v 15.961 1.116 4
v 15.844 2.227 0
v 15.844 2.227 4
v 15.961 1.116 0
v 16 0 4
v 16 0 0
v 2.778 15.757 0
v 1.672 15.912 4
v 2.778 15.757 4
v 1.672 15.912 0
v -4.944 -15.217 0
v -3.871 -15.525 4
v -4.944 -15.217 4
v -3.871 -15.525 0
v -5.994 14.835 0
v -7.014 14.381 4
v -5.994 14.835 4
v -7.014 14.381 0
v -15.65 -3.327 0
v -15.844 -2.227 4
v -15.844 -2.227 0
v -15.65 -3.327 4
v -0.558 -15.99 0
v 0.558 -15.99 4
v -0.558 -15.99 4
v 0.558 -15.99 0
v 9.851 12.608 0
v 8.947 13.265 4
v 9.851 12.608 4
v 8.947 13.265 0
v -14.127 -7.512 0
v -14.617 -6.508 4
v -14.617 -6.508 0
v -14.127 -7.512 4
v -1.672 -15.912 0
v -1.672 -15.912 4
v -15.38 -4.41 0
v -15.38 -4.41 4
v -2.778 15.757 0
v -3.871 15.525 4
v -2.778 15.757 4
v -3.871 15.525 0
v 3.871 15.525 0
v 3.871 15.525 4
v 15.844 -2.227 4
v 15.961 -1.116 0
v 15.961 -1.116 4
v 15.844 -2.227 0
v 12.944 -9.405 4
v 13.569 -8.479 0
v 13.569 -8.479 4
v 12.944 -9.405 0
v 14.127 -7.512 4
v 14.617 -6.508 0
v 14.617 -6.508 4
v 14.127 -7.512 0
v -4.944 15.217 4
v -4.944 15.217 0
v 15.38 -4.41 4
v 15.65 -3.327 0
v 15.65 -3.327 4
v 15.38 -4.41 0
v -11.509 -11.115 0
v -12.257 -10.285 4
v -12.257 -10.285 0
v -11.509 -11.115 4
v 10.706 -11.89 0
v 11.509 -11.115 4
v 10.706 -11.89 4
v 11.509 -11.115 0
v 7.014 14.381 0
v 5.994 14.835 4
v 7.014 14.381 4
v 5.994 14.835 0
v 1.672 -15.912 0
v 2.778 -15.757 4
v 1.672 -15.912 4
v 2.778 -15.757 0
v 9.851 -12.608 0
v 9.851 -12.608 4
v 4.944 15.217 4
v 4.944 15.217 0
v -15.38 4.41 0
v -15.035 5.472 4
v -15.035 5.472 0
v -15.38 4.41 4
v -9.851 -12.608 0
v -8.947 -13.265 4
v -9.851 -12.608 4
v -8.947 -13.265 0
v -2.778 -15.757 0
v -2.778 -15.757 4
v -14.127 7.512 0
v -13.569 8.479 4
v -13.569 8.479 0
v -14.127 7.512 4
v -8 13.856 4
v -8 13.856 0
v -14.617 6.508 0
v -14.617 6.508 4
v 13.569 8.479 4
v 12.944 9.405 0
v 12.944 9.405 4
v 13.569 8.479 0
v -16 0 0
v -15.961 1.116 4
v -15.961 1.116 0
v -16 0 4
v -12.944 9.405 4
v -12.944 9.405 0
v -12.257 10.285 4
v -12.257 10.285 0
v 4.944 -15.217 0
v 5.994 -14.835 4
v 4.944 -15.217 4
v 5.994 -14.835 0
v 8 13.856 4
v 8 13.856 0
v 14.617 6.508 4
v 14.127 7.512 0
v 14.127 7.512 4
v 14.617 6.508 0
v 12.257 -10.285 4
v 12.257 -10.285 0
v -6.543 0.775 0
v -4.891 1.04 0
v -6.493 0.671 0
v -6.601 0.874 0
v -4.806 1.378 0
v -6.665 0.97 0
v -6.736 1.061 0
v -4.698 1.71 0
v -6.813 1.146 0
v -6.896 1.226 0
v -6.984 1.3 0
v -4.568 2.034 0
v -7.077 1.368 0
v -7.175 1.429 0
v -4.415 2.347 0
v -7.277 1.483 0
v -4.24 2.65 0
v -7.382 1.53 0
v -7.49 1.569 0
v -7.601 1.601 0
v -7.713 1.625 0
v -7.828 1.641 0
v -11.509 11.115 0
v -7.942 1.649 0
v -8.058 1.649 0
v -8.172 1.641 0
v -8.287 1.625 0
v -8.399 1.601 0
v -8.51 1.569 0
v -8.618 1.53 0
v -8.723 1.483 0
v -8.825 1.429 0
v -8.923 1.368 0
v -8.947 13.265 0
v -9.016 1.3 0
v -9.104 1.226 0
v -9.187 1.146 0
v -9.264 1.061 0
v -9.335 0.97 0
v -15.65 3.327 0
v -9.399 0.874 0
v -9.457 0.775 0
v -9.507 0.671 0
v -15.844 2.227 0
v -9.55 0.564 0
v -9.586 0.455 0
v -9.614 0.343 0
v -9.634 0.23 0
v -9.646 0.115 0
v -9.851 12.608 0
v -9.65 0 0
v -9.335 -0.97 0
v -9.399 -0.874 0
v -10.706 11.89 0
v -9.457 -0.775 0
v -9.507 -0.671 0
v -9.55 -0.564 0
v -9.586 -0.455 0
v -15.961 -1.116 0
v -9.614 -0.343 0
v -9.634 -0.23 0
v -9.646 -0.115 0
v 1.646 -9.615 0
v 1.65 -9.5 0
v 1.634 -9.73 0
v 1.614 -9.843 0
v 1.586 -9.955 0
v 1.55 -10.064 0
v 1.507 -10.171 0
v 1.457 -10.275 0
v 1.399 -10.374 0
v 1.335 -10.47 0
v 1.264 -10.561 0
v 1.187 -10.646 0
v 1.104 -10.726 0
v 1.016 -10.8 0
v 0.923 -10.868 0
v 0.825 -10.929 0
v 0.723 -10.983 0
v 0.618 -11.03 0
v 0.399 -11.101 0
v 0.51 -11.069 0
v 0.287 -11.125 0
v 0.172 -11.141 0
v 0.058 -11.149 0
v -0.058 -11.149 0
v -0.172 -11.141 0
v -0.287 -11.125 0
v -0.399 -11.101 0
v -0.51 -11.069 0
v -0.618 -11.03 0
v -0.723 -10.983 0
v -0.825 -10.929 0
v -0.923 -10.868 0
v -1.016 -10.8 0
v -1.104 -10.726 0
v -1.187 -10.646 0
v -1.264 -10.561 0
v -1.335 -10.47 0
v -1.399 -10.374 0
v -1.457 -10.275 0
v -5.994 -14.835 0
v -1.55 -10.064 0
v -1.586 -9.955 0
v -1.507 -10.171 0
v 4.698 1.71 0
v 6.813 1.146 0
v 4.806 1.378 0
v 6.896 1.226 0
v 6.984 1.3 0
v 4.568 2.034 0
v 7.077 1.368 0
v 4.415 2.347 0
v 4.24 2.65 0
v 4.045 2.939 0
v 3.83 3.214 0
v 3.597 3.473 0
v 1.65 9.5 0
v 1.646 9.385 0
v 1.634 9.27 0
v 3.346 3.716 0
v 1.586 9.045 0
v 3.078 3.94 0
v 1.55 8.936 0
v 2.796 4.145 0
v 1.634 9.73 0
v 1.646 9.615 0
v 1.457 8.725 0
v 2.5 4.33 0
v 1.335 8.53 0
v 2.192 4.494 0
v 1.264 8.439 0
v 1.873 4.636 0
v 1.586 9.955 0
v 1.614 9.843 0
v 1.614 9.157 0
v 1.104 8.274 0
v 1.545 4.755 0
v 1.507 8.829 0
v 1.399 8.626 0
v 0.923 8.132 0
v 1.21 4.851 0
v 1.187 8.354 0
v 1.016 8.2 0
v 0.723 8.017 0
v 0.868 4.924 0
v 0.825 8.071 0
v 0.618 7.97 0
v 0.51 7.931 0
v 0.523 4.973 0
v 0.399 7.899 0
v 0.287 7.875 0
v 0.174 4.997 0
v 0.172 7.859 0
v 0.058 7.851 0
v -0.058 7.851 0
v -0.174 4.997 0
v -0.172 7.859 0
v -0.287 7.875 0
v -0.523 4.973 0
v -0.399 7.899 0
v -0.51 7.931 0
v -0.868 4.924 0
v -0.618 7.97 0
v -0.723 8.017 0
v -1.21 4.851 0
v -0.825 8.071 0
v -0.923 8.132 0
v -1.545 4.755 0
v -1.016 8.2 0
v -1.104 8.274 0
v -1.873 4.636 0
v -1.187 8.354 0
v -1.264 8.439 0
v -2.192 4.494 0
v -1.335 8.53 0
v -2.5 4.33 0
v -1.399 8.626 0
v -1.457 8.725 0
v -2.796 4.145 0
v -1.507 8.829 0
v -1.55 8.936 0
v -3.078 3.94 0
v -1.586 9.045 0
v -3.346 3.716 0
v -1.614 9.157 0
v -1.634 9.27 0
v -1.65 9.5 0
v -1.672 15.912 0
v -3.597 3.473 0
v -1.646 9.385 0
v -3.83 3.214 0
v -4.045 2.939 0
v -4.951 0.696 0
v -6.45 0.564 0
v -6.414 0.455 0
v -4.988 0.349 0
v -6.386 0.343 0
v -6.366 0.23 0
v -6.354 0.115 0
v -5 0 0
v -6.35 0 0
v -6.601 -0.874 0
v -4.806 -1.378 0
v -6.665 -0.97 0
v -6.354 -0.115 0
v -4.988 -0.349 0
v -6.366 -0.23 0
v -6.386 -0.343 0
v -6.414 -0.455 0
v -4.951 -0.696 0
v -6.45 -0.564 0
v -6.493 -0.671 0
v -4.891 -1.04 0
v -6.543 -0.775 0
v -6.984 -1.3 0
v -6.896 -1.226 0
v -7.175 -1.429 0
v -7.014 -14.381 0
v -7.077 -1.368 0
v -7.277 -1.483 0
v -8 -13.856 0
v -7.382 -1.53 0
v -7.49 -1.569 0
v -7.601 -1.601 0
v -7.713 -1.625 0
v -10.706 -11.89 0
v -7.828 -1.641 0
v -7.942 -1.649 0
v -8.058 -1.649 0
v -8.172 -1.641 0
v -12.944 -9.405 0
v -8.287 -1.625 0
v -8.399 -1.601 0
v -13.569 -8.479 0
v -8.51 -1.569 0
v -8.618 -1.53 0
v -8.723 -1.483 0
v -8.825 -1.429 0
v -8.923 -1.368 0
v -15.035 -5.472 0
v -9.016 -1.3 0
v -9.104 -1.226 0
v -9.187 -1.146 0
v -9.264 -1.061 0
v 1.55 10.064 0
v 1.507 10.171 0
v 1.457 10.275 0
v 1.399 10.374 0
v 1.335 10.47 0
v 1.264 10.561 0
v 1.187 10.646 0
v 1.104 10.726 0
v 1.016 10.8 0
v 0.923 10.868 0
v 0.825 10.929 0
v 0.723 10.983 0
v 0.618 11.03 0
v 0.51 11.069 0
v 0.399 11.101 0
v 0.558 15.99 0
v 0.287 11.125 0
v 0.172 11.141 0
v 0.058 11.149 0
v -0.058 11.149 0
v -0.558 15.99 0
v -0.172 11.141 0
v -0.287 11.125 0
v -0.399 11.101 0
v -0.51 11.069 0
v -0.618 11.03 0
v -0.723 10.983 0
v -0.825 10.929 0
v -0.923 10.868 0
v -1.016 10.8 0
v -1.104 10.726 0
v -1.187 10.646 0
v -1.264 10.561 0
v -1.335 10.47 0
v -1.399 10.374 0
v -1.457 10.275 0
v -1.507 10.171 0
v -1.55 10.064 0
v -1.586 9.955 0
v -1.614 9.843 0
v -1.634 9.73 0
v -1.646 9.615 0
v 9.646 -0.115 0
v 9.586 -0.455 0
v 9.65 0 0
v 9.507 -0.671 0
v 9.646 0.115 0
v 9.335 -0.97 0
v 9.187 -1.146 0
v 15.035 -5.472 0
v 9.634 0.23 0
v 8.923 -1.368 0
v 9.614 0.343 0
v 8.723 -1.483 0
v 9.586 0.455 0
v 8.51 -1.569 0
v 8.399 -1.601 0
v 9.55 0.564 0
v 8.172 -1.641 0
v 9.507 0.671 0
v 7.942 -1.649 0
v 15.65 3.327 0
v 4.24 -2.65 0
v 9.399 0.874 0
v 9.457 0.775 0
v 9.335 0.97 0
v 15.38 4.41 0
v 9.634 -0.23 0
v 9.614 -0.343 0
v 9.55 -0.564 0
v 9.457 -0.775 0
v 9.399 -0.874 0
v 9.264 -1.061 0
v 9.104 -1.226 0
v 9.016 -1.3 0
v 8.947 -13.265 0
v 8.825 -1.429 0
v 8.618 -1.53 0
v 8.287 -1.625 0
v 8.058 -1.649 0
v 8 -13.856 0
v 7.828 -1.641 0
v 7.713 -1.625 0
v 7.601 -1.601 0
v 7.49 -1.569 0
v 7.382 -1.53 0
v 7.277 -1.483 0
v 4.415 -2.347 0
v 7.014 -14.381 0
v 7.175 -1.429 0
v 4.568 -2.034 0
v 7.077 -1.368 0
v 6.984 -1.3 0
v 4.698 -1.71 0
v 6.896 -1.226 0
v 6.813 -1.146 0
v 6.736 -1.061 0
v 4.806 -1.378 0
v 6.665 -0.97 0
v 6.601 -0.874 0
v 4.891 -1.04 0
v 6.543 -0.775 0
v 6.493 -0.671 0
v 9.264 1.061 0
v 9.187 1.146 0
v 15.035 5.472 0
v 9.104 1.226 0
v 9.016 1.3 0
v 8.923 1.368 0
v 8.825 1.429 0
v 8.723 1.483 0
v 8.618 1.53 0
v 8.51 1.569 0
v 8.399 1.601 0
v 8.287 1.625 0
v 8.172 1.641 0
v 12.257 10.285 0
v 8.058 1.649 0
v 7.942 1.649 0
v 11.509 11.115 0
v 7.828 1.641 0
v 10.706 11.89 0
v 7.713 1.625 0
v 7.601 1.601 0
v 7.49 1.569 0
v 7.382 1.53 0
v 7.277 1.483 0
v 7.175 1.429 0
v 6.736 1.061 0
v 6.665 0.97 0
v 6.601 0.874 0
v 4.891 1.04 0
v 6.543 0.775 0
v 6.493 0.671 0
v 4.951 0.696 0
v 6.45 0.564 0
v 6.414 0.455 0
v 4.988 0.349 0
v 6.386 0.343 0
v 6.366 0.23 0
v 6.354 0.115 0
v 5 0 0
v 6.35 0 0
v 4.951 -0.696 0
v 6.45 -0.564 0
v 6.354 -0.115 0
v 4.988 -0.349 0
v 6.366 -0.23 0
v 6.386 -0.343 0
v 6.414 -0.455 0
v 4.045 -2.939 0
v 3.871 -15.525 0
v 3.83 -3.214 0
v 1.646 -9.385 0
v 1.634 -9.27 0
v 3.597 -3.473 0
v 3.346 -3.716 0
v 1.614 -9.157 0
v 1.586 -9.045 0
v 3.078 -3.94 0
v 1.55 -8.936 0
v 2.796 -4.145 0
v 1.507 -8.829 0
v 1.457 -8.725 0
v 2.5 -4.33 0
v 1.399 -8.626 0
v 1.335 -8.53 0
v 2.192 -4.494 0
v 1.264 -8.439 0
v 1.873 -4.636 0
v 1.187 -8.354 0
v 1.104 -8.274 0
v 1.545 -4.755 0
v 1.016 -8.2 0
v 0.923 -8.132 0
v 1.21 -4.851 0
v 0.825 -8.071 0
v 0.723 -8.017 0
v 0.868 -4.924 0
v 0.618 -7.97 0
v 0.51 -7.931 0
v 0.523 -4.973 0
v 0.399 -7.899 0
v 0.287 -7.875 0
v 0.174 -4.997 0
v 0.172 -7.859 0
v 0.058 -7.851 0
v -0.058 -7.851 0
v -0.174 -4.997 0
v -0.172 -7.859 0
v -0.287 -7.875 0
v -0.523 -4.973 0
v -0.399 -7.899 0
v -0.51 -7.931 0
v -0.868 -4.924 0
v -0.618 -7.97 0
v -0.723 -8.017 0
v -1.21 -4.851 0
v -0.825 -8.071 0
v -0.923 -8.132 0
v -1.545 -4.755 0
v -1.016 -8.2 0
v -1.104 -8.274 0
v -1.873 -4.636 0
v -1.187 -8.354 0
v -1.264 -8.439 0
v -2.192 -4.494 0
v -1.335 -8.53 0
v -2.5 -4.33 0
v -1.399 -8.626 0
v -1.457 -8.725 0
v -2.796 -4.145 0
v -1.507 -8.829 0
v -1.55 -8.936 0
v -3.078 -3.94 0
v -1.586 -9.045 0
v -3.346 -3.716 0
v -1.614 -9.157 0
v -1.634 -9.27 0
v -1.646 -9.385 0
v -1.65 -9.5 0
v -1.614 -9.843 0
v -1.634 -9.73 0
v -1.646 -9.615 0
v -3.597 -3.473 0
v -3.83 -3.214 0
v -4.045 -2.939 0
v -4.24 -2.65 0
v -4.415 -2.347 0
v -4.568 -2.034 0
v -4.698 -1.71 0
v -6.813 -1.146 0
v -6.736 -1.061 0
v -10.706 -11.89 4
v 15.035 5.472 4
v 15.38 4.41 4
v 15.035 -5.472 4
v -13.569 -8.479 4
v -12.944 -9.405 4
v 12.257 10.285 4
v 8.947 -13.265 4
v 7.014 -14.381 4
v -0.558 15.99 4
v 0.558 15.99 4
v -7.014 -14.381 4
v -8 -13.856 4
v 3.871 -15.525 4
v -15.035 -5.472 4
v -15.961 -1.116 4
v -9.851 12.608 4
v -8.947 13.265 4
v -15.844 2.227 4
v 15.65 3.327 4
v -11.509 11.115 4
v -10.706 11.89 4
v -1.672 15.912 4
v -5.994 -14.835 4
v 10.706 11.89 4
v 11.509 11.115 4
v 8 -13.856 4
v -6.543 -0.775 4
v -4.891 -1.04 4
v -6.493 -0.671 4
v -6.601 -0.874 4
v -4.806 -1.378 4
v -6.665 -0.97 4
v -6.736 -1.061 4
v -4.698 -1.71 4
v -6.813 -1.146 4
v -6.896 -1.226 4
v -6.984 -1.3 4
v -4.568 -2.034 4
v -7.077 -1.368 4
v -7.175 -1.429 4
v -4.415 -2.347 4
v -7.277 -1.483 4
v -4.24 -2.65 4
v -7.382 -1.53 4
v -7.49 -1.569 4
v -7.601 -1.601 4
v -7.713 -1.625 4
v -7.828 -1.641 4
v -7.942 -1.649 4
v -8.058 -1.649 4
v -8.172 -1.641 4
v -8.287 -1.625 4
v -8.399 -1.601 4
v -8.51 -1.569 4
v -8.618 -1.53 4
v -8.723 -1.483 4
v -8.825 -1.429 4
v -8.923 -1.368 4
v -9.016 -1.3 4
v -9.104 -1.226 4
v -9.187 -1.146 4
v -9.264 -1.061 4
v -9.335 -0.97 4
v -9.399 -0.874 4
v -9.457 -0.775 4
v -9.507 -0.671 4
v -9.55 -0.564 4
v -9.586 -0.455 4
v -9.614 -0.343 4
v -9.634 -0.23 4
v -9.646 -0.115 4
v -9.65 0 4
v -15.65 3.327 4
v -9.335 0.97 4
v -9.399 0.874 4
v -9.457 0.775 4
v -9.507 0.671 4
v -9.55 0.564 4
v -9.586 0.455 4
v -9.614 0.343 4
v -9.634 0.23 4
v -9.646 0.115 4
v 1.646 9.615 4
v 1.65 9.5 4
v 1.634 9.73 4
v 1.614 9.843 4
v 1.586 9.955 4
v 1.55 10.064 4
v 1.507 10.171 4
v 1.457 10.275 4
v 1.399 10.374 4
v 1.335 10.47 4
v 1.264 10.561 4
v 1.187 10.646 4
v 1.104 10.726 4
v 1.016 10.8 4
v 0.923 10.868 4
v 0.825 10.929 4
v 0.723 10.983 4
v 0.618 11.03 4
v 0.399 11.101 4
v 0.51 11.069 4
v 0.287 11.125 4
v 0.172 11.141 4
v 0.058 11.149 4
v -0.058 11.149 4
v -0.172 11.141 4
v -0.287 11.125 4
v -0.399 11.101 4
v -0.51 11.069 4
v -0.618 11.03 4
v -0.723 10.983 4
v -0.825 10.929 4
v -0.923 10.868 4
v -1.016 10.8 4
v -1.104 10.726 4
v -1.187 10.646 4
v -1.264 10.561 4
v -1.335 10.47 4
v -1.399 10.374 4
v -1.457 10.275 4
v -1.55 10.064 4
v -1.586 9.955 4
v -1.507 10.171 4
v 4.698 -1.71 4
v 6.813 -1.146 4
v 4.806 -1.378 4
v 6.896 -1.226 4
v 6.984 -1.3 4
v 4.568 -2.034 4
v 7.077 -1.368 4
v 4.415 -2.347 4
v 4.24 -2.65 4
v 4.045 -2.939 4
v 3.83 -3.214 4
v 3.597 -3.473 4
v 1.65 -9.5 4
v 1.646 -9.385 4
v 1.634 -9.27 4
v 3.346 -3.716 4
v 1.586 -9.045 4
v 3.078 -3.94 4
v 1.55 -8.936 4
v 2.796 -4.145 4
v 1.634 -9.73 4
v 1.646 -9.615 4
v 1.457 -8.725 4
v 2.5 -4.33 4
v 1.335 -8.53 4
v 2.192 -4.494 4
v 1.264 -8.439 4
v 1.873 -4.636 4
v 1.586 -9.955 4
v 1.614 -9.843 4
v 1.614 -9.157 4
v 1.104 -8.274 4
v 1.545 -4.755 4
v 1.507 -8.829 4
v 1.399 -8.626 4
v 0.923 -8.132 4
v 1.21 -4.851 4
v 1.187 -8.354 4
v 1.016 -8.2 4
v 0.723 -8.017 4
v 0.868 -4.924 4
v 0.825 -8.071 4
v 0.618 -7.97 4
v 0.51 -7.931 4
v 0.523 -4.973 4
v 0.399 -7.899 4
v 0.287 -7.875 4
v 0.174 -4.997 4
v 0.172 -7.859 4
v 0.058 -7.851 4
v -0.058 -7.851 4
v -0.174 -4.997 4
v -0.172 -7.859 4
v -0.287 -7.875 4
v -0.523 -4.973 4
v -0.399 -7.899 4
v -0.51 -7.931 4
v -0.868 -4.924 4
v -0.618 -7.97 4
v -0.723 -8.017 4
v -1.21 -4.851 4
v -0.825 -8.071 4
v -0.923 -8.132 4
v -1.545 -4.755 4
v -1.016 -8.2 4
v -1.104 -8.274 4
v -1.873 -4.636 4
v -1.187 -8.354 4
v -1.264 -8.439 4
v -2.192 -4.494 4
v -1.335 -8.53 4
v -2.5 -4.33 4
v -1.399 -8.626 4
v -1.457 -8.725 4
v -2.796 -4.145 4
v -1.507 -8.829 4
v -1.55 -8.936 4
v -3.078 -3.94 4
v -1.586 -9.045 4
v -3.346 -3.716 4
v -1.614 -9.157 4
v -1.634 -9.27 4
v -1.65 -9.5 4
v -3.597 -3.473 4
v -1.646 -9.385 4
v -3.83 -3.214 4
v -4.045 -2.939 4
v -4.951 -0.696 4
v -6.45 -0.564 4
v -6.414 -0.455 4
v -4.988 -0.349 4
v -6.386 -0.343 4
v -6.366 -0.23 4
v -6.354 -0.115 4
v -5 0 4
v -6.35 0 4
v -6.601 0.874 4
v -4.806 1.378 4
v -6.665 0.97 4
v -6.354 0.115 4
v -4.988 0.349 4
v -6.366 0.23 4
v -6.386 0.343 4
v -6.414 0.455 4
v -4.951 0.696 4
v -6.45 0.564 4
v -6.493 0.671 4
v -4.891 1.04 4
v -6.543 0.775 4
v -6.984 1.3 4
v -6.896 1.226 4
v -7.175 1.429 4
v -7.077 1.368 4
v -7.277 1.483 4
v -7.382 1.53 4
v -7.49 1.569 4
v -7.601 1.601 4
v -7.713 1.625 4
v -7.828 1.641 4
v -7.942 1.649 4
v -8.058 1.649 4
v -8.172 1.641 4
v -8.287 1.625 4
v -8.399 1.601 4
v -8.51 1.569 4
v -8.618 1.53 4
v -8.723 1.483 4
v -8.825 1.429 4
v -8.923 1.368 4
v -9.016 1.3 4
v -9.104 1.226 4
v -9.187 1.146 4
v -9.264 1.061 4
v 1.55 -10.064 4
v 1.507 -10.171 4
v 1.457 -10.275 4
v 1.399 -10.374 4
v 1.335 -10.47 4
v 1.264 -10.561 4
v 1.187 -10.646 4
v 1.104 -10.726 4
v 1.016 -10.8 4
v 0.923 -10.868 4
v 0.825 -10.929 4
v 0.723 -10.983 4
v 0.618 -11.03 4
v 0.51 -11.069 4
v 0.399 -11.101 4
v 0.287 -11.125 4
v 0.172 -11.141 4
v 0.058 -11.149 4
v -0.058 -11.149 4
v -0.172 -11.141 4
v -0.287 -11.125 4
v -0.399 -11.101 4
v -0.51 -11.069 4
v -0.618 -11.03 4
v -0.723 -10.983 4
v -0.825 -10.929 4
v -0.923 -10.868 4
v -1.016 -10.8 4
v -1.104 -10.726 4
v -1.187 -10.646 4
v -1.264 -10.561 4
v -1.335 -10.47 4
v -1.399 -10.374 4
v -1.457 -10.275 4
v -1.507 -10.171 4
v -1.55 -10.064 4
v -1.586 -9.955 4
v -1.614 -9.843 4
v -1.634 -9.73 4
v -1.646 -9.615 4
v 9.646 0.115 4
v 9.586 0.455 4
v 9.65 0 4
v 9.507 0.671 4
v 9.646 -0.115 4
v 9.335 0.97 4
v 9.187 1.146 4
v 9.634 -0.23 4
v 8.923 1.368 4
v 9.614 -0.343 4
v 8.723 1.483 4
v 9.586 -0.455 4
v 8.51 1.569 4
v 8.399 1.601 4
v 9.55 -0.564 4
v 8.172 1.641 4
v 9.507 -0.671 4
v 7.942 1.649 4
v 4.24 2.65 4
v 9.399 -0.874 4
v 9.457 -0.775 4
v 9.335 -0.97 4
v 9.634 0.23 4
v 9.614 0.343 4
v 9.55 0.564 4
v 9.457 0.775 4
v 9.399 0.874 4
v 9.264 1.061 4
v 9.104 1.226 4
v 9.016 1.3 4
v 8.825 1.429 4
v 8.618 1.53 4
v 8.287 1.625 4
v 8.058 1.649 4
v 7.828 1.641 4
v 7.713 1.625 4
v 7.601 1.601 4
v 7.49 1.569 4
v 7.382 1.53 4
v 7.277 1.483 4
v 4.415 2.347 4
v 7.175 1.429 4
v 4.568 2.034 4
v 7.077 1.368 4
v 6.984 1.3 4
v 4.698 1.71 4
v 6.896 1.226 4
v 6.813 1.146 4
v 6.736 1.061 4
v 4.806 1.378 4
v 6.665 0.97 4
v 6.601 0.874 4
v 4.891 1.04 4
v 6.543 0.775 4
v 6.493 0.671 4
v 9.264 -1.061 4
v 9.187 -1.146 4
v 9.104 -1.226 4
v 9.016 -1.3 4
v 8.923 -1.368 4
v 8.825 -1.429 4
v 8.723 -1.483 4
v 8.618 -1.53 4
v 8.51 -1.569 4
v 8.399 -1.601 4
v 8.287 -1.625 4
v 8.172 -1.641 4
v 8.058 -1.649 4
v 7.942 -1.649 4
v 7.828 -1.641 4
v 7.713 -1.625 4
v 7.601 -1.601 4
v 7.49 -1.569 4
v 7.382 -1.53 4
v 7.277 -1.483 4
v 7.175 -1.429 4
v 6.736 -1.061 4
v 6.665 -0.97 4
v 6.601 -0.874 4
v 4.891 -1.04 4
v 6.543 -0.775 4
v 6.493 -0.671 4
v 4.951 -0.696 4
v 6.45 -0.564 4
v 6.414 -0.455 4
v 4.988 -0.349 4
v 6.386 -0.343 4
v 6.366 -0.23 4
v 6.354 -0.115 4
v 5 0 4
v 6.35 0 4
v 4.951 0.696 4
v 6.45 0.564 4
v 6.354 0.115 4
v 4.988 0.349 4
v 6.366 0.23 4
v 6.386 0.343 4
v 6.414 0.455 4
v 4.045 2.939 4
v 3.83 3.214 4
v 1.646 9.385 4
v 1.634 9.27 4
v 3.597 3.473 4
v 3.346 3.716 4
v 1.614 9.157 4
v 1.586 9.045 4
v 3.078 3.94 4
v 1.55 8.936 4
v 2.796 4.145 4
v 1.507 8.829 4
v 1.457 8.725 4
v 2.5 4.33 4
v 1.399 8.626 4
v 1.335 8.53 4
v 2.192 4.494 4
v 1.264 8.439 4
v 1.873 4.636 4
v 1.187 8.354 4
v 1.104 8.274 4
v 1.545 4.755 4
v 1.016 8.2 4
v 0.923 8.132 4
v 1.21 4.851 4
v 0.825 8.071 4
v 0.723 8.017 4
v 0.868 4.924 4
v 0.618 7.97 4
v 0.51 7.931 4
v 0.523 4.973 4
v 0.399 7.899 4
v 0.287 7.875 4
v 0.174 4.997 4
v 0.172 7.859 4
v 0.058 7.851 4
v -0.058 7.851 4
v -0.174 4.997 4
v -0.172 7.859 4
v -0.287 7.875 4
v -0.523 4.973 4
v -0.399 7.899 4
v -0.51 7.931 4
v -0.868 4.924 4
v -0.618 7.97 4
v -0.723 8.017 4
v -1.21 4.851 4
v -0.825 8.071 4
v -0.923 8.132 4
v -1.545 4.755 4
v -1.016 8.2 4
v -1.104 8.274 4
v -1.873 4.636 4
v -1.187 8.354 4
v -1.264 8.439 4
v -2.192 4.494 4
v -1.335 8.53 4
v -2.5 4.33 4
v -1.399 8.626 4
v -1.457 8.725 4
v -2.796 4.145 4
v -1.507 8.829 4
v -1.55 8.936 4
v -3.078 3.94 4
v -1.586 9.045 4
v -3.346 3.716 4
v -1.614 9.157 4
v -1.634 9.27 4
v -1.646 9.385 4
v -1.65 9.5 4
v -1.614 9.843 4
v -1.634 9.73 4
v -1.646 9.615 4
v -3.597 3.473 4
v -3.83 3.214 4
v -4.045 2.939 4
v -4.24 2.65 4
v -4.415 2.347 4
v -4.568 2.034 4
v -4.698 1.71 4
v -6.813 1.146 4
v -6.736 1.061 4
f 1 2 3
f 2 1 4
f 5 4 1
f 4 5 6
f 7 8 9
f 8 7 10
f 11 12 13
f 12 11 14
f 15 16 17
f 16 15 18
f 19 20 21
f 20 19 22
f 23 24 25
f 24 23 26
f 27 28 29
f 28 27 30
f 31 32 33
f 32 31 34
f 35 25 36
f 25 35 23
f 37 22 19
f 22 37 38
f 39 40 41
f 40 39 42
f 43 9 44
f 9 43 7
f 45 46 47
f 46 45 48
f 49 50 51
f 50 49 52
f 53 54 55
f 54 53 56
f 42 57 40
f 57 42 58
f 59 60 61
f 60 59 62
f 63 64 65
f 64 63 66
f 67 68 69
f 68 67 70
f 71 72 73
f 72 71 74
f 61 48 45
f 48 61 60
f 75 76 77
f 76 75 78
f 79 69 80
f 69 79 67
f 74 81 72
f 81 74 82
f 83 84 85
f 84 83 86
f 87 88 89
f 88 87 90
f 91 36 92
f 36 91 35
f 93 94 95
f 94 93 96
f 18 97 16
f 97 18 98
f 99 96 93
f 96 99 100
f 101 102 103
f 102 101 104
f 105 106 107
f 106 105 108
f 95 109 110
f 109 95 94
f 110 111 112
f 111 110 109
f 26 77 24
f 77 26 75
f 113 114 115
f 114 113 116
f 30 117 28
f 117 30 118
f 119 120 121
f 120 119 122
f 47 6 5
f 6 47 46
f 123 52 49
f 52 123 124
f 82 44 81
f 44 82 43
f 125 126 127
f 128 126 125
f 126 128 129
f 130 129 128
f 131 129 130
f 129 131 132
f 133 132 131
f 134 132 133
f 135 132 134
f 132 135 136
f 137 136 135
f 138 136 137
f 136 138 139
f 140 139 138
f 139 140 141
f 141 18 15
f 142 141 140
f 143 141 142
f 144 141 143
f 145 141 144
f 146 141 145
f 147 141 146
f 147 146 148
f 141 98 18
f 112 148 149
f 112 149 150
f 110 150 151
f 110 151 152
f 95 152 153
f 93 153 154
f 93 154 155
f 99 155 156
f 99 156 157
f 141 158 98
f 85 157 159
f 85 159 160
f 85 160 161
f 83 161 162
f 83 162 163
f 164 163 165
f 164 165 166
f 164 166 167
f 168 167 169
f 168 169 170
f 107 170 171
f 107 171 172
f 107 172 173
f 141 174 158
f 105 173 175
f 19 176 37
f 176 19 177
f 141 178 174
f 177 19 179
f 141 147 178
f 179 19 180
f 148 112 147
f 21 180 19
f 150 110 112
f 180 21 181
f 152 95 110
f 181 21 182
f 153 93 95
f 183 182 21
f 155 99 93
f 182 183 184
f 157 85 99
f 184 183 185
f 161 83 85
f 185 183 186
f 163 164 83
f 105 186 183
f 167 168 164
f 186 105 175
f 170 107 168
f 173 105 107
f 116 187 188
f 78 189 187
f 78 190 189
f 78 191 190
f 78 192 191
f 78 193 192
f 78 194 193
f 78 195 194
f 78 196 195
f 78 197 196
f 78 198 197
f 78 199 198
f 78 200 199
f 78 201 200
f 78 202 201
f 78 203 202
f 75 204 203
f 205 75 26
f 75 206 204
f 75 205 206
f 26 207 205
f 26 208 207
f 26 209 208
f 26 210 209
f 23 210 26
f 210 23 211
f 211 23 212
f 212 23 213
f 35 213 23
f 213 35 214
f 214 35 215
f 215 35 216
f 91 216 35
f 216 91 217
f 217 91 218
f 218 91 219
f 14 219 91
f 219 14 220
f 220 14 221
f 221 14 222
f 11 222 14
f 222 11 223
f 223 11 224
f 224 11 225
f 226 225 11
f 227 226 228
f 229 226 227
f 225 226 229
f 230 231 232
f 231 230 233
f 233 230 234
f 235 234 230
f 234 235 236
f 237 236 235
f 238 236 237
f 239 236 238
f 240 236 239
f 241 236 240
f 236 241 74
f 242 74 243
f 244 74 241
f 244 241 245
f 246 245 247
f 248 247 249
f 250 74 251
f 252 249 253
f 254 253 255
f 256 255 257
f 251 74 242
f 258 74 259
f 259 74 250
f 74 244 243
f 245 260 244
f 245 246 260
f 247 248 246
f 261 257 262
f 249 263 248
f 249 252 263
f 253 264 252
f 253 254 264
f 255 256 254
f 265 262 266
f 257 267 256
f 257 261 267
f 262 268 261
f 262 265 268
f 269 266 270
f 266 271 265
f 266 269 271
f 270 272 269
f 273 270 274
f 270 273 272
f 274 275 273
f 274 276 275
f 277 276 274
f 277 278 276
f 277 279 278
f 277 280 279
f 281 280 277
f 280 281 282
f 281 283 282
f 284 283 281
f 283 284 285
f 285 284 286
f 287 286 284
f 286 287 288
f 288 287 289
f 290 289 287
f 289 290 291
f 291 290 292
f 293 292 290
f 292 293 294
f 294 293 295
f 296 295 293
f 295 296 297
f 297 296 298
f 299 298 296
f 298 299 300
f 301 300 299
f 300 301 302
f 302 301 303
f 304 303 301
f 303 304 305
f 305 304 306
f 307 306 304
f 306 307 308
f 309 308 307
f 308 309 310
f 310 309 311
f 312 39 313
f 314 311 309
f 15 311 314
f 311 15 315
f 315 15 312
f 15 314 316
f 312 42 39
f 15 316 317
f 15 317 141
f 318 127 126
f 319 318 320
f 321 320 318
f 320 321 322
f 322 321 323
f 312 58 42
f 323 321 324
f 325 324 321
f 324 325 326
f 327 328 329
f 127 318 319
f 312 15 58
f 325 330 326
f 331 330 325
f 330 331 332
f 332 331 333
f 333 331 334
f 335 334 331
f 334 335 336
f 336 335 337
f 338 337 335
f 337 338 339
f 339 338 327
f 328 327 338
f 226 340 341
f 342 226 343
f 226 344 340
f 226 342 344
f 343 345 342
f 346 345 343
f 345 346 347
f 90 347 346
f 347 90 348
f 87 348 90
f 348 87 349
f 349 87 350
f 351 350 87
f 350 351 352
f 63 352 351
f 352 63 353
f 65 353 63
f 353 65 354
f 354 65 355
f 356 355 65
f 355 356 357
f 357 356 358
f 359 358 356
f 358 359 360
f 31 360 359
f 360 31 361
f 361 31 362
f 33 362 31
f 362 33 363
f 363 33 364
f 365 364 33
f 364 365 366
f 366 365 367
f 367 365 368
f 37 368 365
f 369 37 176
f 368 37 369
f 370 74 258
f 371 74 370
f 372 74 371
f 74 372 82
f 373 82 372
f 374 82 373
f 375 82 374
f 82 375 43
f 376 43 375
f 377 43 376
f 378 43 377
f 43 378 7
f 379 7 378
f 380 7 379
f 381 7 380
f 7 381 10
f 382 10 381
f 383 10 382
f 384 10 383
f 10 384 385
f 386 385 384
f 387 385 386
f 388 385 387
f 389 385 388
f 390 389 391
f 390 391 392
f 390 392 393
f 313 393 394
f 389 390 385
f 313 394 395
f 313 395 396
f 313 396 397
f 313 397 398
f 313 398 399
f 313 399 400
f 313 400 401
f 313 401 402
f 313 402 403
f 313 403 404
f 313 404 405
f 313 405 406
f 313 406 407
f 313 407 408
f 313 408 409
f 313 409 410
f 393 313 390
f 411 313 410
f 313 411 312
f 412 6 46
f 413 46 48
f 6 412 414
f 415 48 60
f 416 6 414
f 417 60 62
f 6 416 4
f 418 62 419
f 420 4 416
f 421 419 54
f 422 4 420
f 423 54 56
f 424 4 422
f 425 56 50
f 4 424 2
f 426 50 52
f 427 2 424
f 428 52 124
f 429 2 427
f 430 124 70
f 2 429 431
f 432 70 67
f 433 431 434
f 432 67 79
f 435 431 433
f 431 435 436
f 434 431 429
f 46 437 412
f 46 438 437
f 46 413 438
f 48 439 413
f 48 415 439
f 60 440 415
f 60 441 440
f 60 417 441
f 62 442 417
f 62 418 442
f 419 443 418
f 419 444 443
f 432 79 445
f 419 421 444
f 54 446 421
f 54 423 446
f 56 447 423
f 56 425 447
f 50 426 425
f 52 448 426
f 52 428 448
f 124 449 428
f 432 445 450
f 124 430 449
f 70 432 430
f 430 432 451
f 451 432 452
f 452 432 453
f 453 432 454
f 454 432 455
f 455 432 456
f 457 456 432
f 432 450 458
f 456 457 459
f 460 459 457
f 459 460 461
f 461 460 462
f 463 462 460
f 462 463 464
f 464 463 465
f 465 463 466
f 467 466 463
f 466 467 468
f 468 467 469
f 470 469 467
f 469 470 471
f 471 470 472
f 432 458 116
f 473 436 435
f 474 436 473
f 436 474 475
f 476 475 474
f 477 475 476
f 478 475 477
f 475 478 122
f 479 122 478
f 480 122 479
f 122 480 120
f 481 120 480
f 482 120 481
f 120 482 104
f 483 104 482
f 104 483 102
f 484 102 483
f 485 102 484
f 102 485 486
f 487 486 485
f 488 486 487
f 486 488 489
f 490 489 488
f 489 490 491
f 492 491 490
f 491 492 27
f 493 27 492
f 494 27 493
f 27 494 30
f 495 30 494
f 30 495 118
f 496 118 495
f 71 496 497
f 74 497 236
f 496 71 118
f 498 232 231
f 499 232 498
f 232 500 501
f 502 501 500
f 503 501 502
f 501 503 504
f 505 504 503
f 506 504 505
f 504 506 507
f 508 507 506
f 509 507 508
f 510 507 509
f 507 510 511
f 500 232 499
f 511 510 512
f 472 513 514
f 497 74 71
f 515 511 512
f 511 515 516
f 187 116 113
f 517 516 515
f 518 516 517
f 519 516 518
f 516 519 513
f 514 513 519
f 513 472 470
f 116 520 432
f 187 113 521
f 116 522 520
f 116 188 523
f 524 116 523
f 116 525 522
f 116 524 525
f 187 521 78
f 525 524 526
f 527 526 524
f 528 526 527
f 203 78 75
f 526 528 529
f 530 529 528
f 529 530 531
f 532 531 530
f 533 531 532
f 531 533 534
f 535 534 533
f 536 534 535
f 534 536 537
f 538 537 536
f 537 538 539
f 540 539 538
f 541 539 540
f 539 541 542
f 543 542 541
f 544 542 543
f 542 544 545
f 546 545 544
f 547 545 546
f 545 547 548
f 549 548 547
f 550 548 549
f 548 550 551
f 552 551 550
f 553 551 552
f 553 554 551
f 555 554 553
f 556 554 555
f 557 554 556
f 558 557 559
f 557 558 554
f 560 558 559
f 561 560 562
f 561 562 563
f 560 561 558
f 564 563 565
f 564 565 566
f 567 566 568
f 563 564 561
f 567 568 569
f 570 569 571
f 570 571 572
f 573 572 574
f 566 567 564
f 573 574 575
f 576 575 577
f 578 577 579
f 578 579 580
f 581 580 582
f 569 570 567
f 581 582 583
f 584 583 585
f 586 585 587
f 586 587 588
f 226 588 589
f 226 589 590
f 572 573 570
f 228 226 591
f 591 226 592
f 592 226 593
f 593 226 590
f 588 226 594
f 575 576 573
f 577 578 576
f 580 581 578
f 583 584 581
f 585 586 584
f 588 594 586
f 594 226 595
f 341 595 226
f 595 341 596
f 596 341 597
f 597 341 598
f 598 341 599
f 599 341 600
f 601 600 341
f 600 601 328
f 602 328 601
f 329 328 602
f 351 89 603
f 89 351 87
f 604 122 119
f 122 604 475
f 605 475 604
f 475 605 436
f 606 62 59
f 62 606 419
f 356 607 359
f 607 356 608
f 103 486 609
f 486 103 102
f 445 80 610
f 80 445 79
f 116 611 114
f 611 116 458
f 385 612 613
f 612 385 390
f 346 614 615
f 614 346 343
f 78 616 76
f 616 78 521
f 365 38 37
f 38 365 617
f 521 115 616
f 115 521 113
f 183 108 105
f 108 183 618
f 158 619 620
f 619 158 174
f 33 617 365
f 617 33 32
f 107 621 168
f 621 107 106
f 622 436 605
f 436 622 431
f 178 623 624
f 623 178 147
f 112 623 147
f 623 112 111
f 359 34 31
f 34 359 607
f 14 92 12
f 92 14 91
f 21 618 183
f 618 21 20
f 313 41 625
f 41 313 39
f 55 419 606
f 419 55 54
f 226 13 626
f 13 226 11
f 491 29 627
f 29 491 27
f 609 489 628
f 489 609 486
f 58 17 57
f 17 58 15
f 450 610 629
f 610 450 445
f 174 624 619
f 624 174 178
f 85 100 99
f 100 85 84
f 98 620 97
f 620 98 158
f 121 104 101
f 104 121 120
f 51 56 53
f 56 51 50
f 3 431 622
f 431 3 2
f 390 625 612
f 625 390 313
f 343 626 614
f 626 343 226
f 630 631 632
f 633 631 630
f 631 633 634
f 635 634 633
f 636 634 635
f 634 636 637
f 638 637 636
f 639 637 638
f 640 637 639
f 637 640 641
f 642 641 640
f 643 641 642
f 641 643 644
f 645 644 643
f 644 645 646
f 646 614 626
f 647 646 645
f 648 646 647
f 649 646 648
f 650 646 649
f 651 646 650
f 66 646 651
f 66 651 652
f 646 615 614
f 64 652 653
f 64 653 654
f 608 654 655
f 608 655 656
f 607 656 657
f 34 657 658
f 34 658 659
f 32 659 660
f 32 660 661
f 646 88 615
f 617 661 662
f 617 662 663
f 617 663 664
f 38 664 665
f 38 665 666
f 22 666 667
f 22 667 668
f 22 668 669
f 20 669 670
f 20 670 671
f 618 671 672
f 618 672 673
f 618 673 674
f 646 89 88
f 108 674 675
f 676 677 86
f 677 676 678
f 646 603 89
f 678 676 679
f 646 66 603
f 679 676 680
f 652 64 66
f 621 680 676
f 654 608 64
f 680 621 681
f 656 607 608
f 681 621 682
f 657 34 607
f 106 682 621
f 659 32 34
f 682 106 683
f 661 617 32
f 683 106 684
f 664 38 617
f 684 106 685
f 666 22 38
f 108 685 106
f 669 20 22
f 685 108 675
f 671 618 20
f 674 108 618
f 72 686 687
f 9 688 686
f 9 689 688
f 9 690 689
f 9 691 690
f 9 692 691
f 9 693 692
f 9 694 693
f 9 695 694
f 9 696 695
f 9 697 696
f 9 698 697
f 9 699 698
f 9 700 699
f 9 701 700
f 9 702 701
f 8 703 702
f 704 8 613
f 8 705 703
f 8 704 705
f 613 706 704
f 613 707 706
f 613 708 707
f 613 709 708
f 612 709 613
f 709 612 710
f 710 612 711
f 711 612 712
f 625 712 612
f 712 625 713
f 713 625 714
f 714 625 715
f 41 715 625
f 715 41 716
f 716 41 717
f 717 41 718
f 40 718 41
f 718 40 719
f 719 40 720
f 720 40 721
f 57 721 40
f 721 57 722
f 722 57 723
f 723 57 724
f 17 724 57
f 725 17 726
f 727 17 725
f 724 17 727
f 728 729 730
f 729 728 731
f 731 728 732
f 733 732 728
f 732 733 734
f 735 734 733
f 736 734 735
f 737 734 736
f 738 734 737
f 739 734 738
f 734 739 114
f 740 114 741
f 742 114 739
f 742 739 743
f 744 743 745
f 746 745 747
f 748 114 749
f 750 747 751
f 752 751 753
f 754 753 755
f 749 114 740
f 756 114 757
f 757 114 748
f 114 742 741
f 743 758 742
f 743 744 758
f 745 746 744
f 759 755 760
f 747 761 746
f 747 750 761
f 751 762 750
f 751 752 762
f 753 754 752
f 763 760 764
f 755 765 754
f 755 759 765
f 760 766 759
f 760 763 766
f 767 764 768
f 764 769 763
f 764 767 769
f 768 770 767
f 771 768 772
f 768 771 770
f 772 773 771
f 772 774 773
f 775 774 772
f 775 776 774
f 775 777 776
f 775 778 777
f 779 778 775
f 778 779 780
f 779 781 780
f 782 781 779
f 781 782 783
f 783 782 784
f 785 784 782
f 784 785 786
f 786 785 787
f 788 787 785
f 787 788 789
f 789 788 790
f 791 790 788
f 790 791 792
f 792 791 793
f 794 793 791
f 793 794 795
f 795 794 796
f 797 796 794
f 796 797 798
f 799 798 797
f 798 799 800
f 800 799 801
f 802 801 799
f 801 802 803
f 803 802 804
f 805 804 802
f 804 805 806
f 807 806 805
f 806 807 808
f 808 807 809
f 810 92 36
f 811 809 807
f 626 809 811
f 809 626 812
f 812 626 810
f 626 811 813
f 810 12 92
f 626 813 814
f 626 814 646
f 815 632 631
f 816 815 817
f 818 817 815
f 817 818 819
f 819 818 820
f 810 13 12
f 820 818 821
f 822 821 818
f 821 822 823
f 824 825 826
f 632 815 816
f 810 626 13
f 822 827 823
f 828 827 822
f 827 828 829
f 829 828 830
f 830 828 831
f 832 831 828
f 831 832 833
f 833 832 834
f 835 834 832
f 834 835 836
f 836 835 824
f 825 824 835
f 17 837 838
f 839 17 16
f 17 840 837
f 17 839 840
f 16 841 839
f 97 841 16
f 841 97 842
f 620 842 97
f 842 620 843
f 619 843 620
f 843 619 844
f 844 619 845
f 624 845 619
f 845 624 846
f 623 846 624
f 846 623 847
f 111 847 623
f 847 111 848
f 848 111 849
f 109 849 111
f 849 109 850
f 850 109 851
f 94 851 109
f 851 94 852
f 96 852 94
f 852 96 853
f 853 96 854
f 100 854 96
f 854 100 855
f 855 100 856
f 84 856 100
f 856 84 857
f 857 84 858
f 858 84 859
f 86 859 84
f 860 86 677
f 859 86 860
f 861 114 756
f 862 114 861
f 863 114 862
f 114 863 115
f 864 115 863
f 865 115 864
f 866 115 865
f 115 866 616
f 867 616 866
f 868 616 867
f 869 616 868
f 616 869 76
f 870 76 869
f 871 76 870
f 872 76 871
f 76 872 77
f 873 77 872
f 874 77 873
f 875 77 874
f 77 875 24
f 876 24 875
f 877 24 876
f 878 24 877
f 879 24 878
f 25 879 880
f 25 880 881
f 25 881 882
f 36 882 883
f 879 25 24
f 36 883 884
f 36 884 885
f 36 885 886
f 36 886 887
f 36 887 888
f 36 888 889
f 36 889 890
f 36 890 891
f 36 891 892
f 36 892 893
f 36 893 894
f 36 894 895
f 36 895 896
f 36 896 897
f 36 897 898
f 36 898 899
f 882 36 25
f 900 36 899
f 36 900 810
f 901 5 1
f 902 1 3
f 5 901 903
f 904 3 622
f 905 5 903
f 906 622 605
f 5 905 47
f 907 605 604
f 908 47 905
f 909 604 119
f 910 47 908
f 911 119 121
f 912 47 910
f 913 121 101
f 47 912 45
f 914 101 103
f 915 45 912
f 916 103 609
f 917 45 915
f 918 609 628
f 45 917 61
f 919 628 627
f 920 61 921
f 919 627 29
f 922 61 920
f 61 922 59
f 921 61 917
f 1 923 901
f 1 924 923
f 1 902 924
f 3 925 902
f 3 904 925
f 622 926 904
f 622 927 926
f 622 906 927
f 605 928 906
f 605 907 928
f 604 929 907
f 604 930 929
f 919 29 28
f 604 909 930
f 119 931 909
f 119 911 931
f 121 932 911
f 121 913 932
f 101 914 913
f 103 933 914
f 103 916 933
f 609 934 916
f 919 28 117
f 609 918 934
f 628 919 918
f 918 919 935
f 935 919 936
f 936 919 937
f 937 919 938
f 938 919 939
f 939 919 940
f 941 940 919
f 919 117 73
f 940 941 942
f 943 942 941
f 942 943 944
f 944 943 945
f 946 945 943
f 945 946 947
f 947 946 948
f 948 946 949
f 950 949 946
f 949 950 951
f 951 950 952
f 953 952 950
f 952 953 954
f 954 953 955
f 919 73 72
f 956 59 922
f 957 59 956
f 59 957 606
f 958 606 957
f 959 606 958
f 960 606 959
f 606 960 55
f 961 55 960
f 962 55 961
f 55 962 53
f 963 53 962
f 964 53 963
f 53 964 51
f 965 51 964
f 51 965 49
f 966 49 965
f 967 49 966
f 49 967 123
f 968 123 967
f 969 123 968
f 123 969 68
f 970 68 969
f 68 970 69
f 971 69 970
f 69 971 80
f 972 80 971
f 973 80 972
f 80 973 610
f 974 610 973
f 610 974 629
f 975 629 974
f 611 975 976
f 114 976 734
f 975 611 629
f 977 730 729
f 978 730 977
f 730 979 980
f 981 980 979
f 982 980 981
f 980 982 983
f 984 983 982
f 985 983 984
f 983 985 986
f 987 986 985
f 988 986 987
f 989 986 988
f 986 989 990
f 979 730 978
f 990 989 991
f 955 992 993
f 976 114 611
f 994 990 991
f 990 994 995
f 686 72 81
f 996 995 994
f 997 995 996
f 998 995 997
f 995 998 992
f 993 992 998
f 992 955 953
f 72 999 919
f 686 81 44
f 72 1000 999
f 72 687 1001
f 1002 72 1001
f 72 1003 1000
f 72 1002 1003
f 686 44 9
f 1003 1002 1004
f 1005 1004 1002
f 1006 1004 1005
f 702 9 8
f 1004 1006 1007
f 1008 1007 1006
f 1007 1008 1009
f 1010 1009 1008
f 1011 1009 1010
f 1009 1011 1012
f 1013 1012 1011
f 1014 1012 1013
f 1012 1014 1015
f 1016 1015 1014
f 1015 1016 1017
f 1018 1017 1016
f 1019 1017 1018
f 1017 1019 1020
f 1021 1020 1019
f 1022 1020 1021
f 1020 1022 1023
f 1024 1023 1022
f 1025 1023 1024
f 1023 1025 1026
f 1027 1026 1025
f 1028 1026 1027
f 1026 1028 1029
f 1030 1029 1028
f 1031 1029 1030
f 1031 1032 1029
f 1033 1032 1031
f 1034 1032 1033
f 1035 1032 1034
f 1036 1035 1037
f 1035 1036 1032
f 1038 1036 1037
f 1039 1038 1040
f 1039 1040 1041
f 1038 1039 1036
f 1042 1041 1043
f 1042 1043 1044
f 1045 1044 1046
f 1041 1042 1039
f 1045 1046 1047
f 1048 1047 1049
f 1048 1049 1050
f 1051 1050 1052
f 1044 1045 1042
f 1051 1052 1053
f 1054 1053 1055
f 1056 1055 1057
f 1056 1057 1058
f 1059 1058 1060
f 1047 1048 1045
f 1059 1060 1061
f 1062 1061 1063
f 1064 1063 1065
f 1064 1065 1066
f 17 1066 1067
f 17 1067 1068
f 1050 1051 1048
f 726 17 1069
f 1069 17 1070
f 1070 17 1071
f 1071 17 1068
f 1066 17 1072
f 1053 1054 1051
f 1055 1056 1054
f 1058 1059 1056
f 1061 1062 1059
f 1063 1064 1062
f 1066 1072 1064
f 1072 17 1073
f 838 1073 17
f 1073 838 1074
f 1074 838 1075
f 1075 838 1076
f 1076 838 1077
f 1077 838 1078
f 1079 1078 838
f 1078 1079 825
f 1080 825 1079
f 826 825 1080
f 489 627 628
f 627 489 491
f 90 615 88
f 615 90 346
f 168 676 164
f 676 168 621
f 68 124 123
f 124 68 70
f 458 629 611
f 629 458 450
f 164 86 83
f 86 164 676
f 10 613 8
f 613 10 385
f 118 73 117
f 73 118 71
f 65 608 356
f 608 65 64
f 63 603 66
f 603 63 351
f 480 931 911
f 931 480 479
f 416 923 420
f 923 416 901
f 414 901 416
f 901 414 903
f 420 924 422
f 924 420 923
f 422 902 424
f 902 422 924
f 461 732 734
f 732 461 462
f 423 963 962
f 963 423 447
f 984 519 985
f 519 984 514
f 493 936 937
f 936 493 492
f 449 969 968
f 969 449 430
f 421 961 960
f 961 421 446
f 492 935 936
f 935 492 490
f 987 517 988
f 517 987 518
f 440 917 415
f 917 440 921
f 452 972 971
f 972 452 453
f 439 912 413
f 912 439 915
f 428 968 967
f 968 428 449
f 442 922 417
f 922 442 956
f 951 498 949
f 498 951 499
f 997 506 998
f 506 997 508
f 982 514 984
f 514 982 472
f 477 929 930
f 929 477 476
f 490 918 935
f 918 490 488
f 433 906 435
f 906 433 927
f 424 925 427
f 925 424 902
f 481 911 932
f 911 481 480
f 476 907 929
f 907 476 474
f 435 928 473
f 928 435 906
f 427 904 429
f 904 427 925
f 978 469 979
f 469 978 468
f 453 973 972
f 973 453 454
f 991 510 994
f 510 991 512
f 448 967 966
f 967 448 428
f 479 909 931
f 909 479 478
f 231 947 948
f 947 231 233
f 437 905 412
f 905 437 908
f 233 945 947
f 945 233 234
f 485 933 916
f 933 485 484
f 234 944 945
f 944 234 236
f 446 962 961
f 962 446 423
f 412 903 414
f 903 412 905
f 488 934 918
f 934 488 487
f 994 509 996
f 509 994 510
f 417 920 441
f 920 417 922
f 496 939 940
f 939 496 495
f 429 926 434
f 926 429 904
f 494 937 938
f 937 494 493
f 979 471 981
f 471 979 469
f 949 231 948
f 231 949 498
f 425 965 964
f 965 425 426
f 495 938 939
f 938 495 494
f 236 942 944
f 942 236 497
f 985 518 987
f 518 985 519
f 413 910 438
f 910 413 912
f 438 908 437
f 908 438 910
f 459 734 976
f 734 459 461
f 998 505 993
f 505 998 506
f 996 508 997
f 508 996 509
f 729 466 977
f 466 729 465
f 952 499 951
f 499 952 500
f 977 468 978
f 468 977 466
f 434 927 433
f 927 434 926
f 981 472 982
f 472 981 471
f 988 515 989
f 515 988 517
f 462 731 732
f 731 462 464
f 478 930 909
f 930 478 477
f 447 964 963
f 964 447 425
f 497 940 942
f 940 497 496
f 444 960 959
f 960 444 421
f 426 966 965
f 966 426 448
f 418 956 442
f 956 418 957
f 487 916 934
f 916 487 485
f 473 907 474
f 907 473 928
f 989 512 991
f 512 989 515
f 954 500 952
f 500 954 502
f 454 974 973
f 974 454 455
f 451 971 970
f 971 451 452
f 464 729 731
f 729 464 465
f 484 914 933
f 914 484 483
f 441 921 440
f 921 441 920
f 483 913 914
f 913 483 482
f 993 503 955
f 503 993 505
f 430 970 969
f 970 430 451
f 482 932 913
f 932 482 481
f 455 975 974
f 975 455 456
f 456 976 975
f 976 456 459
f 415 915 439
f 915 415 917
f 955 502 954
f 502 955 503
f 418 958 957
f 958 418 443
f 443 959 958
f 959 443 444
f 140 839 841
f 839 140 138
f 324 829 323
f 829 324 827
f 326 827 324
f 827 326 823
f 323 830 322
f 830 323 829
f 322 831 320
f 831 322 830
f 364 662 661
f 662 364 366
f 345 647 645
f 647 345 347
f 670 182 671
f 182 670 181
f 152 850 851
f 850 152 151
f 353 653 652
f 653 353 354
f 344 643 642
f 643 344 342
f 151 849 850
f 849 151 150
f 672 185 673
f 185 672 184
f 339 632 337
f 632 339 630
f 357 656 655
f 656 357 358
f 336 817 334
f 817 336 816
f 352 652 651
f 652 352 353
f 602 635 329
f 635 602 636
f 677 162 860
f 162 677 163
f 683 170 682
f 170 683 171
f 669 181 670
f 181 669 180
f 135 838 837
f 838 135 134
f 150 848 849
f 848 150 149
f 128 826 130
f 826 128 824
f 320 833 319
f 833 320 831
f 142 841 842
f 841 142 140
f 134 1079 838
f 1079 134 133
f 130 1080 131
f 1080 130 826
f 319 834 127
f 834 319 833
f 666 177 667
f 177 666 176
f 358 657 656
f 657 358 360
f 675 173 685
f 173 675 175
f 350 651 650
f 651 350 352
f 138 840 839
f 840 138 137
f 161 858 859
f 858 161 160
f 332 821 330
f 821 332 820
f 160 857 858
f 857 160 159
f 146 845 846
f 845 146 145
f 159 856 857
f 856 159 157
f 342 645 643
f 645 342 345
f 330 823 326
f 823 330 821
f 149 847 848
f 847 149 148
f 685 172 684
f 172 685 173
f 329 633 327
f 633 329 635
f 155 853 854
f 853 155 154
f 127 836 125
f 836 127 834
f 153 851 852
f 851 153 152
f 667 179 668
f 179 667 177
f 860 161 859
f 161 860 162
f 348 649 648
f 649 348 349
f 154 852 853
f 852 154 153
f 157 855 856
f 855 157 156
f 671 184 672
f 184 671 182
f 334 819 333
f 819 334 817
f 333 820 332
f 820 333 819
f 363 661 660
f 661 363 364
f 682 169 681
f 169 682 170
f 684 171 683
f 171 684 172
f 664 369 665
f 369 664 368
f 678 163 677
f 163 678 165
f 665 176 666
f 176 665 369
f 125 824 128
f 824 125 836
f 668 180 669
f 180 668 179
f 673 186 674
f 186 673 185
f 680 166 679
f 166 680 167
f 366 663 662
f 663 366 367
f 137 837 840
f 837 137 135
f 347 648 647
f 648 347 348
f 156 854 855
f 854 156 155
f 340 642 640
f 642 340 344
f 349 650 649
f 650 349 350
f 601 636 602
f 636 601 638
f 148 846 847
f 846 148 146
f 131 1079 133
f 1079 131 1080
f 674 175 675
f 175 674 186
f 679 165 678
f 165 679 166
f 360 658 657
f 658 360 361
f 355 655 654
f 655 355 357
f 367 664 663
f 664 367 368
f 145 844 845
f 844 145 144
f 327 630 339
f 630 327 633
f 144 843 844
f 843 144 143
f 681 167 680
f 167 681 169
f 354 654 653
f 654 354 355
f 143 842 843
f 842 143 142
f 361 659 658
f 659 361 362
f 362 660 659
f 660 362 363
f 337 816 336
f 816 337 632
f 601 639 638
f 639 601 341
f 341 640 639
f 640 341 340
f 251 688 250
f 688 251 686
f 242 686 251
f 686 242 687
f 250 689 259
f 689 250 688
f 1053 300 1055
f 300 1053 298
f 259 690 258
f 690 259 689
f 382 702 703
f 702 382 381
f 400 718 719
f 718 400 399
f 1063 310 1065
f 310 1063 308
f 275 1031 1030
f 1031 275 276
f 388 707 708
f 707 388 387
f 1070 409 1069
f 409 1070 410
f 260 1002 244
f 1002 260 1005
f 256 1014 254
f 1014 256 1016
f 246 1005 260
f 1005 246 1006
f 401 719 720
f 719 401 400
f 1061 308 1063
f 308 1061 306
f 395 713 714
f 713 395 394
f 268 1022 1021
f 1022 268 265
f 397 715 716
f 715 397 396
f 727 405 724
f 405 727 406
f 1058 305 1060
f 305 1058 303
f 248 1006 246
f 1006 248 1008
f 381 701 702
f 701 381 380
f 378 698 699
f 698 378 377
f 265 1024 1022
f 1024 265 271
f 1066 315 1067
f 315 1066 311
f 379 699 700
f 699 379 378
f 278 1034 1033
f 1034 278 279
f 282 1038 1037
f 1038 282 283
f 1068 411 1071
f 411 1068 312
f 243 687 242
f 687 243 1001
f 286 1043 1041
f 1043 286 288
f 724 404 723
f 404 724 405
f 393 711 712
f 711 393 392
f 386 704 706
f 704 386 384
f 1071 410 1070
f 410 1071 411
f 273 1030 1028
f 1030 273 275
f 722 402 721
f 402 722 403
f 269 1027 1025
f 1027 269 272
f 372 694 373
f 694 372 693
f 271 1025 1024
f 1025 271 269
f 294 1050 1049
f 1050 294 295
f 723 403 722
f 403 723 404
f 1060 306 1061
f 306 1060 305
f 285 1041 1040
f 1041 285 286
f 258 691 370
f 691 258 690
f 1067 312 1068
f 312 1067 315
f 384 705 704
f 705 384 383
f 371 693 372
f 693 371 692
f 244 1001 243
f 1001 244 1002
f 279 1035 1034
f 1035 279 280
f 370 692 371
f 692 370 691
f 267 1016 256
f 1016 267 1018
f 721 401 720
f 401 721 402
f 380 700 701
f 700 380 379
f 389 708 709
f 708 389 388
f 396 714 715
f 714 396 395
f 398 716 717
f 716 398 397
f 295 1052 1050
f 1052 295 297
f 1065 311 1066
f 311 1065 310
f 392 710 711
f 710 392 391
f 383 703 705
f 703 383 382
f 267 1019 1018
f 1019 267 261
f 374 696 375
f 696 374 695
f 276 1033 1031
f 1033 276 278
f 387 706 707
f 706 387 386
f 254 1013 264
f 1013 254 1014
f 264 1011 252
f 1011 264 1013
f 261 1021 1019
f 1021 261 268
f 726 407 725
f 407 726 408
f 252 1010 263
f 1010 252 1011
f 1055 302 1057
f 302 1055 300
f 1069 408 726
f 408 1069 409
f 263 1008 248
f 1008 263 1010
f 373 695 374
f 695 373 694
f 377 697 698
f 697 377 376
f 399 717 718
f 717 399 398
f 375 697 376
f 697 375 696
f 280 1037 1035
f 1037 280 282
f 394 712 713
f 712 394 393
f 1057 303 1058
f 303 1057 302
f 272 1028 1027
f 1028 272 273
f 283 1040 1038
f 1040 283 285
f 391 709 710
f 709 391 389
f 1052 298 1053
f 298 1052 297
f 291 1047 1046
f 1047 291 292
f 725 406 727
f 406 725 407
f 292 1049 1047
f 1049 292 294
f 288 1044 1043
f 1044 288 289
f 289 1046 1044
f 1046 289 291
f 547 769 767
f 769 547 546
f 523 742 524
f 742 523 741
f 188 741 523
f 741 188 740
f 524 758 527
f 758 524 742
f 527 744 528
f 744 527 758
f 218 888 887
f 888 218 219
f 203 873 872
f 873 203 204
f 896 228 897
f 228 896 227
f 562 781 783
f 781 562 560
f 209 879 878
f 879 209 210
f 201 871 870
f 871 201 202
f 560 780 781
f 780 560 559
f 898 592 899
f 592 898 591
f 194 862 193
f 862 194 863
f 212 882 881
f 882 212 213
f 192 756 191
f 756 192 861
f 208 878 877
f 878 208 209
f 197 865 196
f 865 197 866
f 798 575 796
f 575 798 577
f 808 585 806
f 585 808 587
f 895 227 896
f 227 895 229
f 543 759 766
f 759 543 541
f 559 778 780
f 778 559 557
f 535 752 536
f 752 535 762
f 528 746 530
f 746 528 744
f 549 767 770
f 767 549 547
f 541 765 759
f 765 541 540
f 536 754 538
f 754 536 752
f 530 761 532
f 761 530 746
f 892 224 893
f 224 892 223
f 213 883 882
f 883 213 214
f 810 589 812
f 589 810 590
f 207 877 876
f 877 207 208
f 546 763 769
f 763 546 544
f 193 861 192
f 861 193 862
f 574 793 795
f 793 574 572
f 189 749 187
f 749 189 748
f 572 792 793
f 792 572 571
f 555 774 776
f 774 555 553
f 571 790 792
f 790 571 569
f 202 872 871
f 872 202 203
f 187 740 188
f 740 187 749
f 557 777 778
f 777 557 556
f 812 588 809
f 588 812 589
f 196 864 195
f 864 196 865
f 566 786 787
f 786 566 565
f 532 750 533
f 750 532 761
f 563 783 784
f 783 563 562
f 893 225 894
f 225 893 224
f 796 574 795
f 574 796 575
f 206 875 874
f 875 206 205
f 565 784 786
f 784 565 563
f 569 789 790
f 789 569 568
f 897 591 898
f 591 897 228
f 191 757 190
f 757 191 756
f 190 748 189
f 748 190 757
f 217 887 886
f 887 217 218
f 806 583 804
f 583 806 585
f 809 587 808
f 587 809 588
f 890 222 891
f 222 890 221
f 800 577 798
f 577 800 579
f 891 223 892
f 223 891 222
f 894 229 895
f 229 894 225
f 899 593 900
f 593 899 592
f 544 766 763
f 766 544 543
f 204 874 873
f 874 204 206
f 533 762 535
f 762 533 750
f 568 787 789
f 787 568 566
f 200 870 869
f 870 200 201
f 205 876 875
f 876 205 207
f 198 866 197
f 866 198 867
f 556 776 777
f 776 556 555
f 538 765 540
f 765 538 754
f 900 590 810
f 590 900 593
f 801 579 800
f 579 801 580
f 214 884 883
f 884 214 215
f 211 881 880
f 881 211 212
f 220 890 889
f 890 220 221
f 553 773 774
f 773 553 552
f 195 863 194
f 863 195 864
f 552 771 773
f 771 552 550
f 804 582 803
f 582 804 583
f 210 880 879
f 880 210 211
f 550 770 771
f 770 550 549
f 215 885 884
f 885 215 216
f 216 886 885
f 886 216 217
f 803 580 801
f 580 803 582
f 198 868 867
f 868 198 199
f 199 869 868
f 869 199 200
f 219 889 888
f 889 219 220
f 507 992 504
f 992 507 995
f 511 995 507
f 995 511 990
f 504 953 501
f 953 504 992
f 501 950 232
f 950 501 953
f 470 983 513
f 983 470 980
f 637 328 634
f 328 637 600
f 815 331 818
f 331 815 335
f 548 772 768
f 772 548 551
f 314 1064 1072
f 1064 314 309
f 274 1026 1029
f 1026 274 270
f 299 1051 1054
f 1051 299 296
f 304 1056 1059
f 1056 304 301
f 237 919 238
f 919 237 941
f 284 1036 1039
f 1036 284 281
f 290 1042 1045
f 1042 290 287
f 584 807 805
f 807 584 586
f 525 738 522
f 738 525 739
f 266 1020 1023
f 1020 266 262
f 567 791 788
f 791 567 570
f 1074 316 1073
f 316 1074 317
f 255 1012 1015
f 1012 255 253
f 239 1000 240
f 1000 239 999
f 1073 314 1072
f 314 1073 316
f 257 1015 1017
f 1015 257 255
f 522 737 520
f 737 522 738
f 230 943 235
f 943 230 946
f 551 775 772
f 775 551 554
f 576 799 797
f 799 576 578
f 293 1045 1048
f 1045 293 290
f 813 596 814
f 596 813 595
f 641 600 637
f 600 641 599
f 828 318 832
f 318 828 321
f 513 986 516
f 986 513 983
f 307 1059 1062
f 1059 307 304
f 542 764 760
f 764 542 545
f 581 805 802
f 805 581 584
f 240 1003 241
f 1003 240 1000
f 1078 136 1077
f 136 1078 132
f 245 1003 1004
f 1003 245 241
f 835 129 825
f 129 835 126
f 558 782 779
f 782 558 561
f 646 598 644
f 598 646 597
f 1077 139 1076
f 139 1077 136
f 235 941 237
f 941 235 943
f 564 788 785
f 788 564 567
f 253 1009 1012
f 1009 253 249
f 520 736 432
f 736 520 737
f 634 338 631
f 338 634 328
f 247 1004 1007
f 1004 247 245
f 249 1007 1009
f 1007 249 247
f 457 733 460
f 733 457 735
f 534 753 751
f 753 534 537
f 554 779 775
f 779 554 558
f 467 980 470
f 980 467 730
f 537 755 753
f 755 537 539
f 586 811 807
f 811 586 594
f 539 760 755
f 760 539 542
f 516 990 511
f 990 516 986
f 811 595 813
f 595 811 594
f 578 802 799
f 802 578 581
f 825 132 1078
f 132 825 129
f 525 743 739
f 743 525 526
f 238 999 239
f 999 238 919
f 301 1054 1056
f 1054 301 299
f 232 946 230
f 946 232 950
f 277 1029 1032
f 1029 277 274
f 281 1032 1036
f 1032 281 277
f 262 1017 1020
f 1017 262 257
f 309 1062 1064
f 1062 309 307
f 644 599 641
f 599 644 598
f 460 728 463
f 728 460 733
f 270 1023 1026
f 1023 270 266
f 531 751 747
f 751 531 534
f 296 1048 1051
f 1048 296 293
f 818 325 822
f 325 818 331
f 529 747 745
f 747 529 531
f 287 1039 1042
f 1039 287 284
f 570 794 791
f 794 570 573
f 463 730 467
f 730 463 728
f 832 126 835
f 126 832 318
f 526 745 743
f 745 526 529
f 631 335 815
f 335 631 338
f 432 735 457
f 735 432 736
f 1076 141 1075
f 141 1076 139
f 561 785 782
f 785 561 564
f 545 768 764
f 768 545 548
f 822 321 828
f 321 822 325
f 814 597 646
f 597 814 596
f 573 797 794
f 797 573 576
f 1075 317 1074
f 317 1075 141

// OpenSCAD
$fn = 90;

// Dimensions
motor_base_height = 4;          // Height of motor mount base
motor_mount_diameter = 32;      // Diameter of motor mounting base
motor_mount_hole = 3.3;         // Diameter of motor mounting holes
motor_center_hole_diameter = 10; // Diameter of center hole. Set to 0 to disable

module main() {
    translate([0, 25, 0]) {
        !motor_mount(motor_center_hole_diameter);
    }

    translate([0, -25, 0]) {
        motor_mount(0);
    }
}

module motor_mount(center_hole) {
    h_center_3 = -motor_base_height * 3 / 2 + motor_base_height / 2;
    h3 = motor_base_height * 3;
    // distance = motor_mount_hole_spacing / 2;

    difference() {
        // Base plate
        cylinder(r=motor_mount_diameter / 2, h=motor_base_height);

        // Mounting holes
        translate([8, 0, h_center_3])
            hole(motor_mount_hole, h3);
        translate([-8, 0, h_center_3])
            hole(motor_mount_hole, h3);
        translate([0, 9.5, h_center_3])
            hole(motor_mount_hole, h3);
        translate([0, -9.5, h_center_3])
            hole(motor_mount_hole, h3);

        // Center hole
        if (center_hole > 0) {
            translate([0, 0, h_center_3])
                hole(motor_center_hole_diameter, h3);
        }
    }
}

// Makes a cylinder with diameter the specified diameter and height
module hole(d, h) {
    cylinder(r=d / 2, h=h);
}

main();
